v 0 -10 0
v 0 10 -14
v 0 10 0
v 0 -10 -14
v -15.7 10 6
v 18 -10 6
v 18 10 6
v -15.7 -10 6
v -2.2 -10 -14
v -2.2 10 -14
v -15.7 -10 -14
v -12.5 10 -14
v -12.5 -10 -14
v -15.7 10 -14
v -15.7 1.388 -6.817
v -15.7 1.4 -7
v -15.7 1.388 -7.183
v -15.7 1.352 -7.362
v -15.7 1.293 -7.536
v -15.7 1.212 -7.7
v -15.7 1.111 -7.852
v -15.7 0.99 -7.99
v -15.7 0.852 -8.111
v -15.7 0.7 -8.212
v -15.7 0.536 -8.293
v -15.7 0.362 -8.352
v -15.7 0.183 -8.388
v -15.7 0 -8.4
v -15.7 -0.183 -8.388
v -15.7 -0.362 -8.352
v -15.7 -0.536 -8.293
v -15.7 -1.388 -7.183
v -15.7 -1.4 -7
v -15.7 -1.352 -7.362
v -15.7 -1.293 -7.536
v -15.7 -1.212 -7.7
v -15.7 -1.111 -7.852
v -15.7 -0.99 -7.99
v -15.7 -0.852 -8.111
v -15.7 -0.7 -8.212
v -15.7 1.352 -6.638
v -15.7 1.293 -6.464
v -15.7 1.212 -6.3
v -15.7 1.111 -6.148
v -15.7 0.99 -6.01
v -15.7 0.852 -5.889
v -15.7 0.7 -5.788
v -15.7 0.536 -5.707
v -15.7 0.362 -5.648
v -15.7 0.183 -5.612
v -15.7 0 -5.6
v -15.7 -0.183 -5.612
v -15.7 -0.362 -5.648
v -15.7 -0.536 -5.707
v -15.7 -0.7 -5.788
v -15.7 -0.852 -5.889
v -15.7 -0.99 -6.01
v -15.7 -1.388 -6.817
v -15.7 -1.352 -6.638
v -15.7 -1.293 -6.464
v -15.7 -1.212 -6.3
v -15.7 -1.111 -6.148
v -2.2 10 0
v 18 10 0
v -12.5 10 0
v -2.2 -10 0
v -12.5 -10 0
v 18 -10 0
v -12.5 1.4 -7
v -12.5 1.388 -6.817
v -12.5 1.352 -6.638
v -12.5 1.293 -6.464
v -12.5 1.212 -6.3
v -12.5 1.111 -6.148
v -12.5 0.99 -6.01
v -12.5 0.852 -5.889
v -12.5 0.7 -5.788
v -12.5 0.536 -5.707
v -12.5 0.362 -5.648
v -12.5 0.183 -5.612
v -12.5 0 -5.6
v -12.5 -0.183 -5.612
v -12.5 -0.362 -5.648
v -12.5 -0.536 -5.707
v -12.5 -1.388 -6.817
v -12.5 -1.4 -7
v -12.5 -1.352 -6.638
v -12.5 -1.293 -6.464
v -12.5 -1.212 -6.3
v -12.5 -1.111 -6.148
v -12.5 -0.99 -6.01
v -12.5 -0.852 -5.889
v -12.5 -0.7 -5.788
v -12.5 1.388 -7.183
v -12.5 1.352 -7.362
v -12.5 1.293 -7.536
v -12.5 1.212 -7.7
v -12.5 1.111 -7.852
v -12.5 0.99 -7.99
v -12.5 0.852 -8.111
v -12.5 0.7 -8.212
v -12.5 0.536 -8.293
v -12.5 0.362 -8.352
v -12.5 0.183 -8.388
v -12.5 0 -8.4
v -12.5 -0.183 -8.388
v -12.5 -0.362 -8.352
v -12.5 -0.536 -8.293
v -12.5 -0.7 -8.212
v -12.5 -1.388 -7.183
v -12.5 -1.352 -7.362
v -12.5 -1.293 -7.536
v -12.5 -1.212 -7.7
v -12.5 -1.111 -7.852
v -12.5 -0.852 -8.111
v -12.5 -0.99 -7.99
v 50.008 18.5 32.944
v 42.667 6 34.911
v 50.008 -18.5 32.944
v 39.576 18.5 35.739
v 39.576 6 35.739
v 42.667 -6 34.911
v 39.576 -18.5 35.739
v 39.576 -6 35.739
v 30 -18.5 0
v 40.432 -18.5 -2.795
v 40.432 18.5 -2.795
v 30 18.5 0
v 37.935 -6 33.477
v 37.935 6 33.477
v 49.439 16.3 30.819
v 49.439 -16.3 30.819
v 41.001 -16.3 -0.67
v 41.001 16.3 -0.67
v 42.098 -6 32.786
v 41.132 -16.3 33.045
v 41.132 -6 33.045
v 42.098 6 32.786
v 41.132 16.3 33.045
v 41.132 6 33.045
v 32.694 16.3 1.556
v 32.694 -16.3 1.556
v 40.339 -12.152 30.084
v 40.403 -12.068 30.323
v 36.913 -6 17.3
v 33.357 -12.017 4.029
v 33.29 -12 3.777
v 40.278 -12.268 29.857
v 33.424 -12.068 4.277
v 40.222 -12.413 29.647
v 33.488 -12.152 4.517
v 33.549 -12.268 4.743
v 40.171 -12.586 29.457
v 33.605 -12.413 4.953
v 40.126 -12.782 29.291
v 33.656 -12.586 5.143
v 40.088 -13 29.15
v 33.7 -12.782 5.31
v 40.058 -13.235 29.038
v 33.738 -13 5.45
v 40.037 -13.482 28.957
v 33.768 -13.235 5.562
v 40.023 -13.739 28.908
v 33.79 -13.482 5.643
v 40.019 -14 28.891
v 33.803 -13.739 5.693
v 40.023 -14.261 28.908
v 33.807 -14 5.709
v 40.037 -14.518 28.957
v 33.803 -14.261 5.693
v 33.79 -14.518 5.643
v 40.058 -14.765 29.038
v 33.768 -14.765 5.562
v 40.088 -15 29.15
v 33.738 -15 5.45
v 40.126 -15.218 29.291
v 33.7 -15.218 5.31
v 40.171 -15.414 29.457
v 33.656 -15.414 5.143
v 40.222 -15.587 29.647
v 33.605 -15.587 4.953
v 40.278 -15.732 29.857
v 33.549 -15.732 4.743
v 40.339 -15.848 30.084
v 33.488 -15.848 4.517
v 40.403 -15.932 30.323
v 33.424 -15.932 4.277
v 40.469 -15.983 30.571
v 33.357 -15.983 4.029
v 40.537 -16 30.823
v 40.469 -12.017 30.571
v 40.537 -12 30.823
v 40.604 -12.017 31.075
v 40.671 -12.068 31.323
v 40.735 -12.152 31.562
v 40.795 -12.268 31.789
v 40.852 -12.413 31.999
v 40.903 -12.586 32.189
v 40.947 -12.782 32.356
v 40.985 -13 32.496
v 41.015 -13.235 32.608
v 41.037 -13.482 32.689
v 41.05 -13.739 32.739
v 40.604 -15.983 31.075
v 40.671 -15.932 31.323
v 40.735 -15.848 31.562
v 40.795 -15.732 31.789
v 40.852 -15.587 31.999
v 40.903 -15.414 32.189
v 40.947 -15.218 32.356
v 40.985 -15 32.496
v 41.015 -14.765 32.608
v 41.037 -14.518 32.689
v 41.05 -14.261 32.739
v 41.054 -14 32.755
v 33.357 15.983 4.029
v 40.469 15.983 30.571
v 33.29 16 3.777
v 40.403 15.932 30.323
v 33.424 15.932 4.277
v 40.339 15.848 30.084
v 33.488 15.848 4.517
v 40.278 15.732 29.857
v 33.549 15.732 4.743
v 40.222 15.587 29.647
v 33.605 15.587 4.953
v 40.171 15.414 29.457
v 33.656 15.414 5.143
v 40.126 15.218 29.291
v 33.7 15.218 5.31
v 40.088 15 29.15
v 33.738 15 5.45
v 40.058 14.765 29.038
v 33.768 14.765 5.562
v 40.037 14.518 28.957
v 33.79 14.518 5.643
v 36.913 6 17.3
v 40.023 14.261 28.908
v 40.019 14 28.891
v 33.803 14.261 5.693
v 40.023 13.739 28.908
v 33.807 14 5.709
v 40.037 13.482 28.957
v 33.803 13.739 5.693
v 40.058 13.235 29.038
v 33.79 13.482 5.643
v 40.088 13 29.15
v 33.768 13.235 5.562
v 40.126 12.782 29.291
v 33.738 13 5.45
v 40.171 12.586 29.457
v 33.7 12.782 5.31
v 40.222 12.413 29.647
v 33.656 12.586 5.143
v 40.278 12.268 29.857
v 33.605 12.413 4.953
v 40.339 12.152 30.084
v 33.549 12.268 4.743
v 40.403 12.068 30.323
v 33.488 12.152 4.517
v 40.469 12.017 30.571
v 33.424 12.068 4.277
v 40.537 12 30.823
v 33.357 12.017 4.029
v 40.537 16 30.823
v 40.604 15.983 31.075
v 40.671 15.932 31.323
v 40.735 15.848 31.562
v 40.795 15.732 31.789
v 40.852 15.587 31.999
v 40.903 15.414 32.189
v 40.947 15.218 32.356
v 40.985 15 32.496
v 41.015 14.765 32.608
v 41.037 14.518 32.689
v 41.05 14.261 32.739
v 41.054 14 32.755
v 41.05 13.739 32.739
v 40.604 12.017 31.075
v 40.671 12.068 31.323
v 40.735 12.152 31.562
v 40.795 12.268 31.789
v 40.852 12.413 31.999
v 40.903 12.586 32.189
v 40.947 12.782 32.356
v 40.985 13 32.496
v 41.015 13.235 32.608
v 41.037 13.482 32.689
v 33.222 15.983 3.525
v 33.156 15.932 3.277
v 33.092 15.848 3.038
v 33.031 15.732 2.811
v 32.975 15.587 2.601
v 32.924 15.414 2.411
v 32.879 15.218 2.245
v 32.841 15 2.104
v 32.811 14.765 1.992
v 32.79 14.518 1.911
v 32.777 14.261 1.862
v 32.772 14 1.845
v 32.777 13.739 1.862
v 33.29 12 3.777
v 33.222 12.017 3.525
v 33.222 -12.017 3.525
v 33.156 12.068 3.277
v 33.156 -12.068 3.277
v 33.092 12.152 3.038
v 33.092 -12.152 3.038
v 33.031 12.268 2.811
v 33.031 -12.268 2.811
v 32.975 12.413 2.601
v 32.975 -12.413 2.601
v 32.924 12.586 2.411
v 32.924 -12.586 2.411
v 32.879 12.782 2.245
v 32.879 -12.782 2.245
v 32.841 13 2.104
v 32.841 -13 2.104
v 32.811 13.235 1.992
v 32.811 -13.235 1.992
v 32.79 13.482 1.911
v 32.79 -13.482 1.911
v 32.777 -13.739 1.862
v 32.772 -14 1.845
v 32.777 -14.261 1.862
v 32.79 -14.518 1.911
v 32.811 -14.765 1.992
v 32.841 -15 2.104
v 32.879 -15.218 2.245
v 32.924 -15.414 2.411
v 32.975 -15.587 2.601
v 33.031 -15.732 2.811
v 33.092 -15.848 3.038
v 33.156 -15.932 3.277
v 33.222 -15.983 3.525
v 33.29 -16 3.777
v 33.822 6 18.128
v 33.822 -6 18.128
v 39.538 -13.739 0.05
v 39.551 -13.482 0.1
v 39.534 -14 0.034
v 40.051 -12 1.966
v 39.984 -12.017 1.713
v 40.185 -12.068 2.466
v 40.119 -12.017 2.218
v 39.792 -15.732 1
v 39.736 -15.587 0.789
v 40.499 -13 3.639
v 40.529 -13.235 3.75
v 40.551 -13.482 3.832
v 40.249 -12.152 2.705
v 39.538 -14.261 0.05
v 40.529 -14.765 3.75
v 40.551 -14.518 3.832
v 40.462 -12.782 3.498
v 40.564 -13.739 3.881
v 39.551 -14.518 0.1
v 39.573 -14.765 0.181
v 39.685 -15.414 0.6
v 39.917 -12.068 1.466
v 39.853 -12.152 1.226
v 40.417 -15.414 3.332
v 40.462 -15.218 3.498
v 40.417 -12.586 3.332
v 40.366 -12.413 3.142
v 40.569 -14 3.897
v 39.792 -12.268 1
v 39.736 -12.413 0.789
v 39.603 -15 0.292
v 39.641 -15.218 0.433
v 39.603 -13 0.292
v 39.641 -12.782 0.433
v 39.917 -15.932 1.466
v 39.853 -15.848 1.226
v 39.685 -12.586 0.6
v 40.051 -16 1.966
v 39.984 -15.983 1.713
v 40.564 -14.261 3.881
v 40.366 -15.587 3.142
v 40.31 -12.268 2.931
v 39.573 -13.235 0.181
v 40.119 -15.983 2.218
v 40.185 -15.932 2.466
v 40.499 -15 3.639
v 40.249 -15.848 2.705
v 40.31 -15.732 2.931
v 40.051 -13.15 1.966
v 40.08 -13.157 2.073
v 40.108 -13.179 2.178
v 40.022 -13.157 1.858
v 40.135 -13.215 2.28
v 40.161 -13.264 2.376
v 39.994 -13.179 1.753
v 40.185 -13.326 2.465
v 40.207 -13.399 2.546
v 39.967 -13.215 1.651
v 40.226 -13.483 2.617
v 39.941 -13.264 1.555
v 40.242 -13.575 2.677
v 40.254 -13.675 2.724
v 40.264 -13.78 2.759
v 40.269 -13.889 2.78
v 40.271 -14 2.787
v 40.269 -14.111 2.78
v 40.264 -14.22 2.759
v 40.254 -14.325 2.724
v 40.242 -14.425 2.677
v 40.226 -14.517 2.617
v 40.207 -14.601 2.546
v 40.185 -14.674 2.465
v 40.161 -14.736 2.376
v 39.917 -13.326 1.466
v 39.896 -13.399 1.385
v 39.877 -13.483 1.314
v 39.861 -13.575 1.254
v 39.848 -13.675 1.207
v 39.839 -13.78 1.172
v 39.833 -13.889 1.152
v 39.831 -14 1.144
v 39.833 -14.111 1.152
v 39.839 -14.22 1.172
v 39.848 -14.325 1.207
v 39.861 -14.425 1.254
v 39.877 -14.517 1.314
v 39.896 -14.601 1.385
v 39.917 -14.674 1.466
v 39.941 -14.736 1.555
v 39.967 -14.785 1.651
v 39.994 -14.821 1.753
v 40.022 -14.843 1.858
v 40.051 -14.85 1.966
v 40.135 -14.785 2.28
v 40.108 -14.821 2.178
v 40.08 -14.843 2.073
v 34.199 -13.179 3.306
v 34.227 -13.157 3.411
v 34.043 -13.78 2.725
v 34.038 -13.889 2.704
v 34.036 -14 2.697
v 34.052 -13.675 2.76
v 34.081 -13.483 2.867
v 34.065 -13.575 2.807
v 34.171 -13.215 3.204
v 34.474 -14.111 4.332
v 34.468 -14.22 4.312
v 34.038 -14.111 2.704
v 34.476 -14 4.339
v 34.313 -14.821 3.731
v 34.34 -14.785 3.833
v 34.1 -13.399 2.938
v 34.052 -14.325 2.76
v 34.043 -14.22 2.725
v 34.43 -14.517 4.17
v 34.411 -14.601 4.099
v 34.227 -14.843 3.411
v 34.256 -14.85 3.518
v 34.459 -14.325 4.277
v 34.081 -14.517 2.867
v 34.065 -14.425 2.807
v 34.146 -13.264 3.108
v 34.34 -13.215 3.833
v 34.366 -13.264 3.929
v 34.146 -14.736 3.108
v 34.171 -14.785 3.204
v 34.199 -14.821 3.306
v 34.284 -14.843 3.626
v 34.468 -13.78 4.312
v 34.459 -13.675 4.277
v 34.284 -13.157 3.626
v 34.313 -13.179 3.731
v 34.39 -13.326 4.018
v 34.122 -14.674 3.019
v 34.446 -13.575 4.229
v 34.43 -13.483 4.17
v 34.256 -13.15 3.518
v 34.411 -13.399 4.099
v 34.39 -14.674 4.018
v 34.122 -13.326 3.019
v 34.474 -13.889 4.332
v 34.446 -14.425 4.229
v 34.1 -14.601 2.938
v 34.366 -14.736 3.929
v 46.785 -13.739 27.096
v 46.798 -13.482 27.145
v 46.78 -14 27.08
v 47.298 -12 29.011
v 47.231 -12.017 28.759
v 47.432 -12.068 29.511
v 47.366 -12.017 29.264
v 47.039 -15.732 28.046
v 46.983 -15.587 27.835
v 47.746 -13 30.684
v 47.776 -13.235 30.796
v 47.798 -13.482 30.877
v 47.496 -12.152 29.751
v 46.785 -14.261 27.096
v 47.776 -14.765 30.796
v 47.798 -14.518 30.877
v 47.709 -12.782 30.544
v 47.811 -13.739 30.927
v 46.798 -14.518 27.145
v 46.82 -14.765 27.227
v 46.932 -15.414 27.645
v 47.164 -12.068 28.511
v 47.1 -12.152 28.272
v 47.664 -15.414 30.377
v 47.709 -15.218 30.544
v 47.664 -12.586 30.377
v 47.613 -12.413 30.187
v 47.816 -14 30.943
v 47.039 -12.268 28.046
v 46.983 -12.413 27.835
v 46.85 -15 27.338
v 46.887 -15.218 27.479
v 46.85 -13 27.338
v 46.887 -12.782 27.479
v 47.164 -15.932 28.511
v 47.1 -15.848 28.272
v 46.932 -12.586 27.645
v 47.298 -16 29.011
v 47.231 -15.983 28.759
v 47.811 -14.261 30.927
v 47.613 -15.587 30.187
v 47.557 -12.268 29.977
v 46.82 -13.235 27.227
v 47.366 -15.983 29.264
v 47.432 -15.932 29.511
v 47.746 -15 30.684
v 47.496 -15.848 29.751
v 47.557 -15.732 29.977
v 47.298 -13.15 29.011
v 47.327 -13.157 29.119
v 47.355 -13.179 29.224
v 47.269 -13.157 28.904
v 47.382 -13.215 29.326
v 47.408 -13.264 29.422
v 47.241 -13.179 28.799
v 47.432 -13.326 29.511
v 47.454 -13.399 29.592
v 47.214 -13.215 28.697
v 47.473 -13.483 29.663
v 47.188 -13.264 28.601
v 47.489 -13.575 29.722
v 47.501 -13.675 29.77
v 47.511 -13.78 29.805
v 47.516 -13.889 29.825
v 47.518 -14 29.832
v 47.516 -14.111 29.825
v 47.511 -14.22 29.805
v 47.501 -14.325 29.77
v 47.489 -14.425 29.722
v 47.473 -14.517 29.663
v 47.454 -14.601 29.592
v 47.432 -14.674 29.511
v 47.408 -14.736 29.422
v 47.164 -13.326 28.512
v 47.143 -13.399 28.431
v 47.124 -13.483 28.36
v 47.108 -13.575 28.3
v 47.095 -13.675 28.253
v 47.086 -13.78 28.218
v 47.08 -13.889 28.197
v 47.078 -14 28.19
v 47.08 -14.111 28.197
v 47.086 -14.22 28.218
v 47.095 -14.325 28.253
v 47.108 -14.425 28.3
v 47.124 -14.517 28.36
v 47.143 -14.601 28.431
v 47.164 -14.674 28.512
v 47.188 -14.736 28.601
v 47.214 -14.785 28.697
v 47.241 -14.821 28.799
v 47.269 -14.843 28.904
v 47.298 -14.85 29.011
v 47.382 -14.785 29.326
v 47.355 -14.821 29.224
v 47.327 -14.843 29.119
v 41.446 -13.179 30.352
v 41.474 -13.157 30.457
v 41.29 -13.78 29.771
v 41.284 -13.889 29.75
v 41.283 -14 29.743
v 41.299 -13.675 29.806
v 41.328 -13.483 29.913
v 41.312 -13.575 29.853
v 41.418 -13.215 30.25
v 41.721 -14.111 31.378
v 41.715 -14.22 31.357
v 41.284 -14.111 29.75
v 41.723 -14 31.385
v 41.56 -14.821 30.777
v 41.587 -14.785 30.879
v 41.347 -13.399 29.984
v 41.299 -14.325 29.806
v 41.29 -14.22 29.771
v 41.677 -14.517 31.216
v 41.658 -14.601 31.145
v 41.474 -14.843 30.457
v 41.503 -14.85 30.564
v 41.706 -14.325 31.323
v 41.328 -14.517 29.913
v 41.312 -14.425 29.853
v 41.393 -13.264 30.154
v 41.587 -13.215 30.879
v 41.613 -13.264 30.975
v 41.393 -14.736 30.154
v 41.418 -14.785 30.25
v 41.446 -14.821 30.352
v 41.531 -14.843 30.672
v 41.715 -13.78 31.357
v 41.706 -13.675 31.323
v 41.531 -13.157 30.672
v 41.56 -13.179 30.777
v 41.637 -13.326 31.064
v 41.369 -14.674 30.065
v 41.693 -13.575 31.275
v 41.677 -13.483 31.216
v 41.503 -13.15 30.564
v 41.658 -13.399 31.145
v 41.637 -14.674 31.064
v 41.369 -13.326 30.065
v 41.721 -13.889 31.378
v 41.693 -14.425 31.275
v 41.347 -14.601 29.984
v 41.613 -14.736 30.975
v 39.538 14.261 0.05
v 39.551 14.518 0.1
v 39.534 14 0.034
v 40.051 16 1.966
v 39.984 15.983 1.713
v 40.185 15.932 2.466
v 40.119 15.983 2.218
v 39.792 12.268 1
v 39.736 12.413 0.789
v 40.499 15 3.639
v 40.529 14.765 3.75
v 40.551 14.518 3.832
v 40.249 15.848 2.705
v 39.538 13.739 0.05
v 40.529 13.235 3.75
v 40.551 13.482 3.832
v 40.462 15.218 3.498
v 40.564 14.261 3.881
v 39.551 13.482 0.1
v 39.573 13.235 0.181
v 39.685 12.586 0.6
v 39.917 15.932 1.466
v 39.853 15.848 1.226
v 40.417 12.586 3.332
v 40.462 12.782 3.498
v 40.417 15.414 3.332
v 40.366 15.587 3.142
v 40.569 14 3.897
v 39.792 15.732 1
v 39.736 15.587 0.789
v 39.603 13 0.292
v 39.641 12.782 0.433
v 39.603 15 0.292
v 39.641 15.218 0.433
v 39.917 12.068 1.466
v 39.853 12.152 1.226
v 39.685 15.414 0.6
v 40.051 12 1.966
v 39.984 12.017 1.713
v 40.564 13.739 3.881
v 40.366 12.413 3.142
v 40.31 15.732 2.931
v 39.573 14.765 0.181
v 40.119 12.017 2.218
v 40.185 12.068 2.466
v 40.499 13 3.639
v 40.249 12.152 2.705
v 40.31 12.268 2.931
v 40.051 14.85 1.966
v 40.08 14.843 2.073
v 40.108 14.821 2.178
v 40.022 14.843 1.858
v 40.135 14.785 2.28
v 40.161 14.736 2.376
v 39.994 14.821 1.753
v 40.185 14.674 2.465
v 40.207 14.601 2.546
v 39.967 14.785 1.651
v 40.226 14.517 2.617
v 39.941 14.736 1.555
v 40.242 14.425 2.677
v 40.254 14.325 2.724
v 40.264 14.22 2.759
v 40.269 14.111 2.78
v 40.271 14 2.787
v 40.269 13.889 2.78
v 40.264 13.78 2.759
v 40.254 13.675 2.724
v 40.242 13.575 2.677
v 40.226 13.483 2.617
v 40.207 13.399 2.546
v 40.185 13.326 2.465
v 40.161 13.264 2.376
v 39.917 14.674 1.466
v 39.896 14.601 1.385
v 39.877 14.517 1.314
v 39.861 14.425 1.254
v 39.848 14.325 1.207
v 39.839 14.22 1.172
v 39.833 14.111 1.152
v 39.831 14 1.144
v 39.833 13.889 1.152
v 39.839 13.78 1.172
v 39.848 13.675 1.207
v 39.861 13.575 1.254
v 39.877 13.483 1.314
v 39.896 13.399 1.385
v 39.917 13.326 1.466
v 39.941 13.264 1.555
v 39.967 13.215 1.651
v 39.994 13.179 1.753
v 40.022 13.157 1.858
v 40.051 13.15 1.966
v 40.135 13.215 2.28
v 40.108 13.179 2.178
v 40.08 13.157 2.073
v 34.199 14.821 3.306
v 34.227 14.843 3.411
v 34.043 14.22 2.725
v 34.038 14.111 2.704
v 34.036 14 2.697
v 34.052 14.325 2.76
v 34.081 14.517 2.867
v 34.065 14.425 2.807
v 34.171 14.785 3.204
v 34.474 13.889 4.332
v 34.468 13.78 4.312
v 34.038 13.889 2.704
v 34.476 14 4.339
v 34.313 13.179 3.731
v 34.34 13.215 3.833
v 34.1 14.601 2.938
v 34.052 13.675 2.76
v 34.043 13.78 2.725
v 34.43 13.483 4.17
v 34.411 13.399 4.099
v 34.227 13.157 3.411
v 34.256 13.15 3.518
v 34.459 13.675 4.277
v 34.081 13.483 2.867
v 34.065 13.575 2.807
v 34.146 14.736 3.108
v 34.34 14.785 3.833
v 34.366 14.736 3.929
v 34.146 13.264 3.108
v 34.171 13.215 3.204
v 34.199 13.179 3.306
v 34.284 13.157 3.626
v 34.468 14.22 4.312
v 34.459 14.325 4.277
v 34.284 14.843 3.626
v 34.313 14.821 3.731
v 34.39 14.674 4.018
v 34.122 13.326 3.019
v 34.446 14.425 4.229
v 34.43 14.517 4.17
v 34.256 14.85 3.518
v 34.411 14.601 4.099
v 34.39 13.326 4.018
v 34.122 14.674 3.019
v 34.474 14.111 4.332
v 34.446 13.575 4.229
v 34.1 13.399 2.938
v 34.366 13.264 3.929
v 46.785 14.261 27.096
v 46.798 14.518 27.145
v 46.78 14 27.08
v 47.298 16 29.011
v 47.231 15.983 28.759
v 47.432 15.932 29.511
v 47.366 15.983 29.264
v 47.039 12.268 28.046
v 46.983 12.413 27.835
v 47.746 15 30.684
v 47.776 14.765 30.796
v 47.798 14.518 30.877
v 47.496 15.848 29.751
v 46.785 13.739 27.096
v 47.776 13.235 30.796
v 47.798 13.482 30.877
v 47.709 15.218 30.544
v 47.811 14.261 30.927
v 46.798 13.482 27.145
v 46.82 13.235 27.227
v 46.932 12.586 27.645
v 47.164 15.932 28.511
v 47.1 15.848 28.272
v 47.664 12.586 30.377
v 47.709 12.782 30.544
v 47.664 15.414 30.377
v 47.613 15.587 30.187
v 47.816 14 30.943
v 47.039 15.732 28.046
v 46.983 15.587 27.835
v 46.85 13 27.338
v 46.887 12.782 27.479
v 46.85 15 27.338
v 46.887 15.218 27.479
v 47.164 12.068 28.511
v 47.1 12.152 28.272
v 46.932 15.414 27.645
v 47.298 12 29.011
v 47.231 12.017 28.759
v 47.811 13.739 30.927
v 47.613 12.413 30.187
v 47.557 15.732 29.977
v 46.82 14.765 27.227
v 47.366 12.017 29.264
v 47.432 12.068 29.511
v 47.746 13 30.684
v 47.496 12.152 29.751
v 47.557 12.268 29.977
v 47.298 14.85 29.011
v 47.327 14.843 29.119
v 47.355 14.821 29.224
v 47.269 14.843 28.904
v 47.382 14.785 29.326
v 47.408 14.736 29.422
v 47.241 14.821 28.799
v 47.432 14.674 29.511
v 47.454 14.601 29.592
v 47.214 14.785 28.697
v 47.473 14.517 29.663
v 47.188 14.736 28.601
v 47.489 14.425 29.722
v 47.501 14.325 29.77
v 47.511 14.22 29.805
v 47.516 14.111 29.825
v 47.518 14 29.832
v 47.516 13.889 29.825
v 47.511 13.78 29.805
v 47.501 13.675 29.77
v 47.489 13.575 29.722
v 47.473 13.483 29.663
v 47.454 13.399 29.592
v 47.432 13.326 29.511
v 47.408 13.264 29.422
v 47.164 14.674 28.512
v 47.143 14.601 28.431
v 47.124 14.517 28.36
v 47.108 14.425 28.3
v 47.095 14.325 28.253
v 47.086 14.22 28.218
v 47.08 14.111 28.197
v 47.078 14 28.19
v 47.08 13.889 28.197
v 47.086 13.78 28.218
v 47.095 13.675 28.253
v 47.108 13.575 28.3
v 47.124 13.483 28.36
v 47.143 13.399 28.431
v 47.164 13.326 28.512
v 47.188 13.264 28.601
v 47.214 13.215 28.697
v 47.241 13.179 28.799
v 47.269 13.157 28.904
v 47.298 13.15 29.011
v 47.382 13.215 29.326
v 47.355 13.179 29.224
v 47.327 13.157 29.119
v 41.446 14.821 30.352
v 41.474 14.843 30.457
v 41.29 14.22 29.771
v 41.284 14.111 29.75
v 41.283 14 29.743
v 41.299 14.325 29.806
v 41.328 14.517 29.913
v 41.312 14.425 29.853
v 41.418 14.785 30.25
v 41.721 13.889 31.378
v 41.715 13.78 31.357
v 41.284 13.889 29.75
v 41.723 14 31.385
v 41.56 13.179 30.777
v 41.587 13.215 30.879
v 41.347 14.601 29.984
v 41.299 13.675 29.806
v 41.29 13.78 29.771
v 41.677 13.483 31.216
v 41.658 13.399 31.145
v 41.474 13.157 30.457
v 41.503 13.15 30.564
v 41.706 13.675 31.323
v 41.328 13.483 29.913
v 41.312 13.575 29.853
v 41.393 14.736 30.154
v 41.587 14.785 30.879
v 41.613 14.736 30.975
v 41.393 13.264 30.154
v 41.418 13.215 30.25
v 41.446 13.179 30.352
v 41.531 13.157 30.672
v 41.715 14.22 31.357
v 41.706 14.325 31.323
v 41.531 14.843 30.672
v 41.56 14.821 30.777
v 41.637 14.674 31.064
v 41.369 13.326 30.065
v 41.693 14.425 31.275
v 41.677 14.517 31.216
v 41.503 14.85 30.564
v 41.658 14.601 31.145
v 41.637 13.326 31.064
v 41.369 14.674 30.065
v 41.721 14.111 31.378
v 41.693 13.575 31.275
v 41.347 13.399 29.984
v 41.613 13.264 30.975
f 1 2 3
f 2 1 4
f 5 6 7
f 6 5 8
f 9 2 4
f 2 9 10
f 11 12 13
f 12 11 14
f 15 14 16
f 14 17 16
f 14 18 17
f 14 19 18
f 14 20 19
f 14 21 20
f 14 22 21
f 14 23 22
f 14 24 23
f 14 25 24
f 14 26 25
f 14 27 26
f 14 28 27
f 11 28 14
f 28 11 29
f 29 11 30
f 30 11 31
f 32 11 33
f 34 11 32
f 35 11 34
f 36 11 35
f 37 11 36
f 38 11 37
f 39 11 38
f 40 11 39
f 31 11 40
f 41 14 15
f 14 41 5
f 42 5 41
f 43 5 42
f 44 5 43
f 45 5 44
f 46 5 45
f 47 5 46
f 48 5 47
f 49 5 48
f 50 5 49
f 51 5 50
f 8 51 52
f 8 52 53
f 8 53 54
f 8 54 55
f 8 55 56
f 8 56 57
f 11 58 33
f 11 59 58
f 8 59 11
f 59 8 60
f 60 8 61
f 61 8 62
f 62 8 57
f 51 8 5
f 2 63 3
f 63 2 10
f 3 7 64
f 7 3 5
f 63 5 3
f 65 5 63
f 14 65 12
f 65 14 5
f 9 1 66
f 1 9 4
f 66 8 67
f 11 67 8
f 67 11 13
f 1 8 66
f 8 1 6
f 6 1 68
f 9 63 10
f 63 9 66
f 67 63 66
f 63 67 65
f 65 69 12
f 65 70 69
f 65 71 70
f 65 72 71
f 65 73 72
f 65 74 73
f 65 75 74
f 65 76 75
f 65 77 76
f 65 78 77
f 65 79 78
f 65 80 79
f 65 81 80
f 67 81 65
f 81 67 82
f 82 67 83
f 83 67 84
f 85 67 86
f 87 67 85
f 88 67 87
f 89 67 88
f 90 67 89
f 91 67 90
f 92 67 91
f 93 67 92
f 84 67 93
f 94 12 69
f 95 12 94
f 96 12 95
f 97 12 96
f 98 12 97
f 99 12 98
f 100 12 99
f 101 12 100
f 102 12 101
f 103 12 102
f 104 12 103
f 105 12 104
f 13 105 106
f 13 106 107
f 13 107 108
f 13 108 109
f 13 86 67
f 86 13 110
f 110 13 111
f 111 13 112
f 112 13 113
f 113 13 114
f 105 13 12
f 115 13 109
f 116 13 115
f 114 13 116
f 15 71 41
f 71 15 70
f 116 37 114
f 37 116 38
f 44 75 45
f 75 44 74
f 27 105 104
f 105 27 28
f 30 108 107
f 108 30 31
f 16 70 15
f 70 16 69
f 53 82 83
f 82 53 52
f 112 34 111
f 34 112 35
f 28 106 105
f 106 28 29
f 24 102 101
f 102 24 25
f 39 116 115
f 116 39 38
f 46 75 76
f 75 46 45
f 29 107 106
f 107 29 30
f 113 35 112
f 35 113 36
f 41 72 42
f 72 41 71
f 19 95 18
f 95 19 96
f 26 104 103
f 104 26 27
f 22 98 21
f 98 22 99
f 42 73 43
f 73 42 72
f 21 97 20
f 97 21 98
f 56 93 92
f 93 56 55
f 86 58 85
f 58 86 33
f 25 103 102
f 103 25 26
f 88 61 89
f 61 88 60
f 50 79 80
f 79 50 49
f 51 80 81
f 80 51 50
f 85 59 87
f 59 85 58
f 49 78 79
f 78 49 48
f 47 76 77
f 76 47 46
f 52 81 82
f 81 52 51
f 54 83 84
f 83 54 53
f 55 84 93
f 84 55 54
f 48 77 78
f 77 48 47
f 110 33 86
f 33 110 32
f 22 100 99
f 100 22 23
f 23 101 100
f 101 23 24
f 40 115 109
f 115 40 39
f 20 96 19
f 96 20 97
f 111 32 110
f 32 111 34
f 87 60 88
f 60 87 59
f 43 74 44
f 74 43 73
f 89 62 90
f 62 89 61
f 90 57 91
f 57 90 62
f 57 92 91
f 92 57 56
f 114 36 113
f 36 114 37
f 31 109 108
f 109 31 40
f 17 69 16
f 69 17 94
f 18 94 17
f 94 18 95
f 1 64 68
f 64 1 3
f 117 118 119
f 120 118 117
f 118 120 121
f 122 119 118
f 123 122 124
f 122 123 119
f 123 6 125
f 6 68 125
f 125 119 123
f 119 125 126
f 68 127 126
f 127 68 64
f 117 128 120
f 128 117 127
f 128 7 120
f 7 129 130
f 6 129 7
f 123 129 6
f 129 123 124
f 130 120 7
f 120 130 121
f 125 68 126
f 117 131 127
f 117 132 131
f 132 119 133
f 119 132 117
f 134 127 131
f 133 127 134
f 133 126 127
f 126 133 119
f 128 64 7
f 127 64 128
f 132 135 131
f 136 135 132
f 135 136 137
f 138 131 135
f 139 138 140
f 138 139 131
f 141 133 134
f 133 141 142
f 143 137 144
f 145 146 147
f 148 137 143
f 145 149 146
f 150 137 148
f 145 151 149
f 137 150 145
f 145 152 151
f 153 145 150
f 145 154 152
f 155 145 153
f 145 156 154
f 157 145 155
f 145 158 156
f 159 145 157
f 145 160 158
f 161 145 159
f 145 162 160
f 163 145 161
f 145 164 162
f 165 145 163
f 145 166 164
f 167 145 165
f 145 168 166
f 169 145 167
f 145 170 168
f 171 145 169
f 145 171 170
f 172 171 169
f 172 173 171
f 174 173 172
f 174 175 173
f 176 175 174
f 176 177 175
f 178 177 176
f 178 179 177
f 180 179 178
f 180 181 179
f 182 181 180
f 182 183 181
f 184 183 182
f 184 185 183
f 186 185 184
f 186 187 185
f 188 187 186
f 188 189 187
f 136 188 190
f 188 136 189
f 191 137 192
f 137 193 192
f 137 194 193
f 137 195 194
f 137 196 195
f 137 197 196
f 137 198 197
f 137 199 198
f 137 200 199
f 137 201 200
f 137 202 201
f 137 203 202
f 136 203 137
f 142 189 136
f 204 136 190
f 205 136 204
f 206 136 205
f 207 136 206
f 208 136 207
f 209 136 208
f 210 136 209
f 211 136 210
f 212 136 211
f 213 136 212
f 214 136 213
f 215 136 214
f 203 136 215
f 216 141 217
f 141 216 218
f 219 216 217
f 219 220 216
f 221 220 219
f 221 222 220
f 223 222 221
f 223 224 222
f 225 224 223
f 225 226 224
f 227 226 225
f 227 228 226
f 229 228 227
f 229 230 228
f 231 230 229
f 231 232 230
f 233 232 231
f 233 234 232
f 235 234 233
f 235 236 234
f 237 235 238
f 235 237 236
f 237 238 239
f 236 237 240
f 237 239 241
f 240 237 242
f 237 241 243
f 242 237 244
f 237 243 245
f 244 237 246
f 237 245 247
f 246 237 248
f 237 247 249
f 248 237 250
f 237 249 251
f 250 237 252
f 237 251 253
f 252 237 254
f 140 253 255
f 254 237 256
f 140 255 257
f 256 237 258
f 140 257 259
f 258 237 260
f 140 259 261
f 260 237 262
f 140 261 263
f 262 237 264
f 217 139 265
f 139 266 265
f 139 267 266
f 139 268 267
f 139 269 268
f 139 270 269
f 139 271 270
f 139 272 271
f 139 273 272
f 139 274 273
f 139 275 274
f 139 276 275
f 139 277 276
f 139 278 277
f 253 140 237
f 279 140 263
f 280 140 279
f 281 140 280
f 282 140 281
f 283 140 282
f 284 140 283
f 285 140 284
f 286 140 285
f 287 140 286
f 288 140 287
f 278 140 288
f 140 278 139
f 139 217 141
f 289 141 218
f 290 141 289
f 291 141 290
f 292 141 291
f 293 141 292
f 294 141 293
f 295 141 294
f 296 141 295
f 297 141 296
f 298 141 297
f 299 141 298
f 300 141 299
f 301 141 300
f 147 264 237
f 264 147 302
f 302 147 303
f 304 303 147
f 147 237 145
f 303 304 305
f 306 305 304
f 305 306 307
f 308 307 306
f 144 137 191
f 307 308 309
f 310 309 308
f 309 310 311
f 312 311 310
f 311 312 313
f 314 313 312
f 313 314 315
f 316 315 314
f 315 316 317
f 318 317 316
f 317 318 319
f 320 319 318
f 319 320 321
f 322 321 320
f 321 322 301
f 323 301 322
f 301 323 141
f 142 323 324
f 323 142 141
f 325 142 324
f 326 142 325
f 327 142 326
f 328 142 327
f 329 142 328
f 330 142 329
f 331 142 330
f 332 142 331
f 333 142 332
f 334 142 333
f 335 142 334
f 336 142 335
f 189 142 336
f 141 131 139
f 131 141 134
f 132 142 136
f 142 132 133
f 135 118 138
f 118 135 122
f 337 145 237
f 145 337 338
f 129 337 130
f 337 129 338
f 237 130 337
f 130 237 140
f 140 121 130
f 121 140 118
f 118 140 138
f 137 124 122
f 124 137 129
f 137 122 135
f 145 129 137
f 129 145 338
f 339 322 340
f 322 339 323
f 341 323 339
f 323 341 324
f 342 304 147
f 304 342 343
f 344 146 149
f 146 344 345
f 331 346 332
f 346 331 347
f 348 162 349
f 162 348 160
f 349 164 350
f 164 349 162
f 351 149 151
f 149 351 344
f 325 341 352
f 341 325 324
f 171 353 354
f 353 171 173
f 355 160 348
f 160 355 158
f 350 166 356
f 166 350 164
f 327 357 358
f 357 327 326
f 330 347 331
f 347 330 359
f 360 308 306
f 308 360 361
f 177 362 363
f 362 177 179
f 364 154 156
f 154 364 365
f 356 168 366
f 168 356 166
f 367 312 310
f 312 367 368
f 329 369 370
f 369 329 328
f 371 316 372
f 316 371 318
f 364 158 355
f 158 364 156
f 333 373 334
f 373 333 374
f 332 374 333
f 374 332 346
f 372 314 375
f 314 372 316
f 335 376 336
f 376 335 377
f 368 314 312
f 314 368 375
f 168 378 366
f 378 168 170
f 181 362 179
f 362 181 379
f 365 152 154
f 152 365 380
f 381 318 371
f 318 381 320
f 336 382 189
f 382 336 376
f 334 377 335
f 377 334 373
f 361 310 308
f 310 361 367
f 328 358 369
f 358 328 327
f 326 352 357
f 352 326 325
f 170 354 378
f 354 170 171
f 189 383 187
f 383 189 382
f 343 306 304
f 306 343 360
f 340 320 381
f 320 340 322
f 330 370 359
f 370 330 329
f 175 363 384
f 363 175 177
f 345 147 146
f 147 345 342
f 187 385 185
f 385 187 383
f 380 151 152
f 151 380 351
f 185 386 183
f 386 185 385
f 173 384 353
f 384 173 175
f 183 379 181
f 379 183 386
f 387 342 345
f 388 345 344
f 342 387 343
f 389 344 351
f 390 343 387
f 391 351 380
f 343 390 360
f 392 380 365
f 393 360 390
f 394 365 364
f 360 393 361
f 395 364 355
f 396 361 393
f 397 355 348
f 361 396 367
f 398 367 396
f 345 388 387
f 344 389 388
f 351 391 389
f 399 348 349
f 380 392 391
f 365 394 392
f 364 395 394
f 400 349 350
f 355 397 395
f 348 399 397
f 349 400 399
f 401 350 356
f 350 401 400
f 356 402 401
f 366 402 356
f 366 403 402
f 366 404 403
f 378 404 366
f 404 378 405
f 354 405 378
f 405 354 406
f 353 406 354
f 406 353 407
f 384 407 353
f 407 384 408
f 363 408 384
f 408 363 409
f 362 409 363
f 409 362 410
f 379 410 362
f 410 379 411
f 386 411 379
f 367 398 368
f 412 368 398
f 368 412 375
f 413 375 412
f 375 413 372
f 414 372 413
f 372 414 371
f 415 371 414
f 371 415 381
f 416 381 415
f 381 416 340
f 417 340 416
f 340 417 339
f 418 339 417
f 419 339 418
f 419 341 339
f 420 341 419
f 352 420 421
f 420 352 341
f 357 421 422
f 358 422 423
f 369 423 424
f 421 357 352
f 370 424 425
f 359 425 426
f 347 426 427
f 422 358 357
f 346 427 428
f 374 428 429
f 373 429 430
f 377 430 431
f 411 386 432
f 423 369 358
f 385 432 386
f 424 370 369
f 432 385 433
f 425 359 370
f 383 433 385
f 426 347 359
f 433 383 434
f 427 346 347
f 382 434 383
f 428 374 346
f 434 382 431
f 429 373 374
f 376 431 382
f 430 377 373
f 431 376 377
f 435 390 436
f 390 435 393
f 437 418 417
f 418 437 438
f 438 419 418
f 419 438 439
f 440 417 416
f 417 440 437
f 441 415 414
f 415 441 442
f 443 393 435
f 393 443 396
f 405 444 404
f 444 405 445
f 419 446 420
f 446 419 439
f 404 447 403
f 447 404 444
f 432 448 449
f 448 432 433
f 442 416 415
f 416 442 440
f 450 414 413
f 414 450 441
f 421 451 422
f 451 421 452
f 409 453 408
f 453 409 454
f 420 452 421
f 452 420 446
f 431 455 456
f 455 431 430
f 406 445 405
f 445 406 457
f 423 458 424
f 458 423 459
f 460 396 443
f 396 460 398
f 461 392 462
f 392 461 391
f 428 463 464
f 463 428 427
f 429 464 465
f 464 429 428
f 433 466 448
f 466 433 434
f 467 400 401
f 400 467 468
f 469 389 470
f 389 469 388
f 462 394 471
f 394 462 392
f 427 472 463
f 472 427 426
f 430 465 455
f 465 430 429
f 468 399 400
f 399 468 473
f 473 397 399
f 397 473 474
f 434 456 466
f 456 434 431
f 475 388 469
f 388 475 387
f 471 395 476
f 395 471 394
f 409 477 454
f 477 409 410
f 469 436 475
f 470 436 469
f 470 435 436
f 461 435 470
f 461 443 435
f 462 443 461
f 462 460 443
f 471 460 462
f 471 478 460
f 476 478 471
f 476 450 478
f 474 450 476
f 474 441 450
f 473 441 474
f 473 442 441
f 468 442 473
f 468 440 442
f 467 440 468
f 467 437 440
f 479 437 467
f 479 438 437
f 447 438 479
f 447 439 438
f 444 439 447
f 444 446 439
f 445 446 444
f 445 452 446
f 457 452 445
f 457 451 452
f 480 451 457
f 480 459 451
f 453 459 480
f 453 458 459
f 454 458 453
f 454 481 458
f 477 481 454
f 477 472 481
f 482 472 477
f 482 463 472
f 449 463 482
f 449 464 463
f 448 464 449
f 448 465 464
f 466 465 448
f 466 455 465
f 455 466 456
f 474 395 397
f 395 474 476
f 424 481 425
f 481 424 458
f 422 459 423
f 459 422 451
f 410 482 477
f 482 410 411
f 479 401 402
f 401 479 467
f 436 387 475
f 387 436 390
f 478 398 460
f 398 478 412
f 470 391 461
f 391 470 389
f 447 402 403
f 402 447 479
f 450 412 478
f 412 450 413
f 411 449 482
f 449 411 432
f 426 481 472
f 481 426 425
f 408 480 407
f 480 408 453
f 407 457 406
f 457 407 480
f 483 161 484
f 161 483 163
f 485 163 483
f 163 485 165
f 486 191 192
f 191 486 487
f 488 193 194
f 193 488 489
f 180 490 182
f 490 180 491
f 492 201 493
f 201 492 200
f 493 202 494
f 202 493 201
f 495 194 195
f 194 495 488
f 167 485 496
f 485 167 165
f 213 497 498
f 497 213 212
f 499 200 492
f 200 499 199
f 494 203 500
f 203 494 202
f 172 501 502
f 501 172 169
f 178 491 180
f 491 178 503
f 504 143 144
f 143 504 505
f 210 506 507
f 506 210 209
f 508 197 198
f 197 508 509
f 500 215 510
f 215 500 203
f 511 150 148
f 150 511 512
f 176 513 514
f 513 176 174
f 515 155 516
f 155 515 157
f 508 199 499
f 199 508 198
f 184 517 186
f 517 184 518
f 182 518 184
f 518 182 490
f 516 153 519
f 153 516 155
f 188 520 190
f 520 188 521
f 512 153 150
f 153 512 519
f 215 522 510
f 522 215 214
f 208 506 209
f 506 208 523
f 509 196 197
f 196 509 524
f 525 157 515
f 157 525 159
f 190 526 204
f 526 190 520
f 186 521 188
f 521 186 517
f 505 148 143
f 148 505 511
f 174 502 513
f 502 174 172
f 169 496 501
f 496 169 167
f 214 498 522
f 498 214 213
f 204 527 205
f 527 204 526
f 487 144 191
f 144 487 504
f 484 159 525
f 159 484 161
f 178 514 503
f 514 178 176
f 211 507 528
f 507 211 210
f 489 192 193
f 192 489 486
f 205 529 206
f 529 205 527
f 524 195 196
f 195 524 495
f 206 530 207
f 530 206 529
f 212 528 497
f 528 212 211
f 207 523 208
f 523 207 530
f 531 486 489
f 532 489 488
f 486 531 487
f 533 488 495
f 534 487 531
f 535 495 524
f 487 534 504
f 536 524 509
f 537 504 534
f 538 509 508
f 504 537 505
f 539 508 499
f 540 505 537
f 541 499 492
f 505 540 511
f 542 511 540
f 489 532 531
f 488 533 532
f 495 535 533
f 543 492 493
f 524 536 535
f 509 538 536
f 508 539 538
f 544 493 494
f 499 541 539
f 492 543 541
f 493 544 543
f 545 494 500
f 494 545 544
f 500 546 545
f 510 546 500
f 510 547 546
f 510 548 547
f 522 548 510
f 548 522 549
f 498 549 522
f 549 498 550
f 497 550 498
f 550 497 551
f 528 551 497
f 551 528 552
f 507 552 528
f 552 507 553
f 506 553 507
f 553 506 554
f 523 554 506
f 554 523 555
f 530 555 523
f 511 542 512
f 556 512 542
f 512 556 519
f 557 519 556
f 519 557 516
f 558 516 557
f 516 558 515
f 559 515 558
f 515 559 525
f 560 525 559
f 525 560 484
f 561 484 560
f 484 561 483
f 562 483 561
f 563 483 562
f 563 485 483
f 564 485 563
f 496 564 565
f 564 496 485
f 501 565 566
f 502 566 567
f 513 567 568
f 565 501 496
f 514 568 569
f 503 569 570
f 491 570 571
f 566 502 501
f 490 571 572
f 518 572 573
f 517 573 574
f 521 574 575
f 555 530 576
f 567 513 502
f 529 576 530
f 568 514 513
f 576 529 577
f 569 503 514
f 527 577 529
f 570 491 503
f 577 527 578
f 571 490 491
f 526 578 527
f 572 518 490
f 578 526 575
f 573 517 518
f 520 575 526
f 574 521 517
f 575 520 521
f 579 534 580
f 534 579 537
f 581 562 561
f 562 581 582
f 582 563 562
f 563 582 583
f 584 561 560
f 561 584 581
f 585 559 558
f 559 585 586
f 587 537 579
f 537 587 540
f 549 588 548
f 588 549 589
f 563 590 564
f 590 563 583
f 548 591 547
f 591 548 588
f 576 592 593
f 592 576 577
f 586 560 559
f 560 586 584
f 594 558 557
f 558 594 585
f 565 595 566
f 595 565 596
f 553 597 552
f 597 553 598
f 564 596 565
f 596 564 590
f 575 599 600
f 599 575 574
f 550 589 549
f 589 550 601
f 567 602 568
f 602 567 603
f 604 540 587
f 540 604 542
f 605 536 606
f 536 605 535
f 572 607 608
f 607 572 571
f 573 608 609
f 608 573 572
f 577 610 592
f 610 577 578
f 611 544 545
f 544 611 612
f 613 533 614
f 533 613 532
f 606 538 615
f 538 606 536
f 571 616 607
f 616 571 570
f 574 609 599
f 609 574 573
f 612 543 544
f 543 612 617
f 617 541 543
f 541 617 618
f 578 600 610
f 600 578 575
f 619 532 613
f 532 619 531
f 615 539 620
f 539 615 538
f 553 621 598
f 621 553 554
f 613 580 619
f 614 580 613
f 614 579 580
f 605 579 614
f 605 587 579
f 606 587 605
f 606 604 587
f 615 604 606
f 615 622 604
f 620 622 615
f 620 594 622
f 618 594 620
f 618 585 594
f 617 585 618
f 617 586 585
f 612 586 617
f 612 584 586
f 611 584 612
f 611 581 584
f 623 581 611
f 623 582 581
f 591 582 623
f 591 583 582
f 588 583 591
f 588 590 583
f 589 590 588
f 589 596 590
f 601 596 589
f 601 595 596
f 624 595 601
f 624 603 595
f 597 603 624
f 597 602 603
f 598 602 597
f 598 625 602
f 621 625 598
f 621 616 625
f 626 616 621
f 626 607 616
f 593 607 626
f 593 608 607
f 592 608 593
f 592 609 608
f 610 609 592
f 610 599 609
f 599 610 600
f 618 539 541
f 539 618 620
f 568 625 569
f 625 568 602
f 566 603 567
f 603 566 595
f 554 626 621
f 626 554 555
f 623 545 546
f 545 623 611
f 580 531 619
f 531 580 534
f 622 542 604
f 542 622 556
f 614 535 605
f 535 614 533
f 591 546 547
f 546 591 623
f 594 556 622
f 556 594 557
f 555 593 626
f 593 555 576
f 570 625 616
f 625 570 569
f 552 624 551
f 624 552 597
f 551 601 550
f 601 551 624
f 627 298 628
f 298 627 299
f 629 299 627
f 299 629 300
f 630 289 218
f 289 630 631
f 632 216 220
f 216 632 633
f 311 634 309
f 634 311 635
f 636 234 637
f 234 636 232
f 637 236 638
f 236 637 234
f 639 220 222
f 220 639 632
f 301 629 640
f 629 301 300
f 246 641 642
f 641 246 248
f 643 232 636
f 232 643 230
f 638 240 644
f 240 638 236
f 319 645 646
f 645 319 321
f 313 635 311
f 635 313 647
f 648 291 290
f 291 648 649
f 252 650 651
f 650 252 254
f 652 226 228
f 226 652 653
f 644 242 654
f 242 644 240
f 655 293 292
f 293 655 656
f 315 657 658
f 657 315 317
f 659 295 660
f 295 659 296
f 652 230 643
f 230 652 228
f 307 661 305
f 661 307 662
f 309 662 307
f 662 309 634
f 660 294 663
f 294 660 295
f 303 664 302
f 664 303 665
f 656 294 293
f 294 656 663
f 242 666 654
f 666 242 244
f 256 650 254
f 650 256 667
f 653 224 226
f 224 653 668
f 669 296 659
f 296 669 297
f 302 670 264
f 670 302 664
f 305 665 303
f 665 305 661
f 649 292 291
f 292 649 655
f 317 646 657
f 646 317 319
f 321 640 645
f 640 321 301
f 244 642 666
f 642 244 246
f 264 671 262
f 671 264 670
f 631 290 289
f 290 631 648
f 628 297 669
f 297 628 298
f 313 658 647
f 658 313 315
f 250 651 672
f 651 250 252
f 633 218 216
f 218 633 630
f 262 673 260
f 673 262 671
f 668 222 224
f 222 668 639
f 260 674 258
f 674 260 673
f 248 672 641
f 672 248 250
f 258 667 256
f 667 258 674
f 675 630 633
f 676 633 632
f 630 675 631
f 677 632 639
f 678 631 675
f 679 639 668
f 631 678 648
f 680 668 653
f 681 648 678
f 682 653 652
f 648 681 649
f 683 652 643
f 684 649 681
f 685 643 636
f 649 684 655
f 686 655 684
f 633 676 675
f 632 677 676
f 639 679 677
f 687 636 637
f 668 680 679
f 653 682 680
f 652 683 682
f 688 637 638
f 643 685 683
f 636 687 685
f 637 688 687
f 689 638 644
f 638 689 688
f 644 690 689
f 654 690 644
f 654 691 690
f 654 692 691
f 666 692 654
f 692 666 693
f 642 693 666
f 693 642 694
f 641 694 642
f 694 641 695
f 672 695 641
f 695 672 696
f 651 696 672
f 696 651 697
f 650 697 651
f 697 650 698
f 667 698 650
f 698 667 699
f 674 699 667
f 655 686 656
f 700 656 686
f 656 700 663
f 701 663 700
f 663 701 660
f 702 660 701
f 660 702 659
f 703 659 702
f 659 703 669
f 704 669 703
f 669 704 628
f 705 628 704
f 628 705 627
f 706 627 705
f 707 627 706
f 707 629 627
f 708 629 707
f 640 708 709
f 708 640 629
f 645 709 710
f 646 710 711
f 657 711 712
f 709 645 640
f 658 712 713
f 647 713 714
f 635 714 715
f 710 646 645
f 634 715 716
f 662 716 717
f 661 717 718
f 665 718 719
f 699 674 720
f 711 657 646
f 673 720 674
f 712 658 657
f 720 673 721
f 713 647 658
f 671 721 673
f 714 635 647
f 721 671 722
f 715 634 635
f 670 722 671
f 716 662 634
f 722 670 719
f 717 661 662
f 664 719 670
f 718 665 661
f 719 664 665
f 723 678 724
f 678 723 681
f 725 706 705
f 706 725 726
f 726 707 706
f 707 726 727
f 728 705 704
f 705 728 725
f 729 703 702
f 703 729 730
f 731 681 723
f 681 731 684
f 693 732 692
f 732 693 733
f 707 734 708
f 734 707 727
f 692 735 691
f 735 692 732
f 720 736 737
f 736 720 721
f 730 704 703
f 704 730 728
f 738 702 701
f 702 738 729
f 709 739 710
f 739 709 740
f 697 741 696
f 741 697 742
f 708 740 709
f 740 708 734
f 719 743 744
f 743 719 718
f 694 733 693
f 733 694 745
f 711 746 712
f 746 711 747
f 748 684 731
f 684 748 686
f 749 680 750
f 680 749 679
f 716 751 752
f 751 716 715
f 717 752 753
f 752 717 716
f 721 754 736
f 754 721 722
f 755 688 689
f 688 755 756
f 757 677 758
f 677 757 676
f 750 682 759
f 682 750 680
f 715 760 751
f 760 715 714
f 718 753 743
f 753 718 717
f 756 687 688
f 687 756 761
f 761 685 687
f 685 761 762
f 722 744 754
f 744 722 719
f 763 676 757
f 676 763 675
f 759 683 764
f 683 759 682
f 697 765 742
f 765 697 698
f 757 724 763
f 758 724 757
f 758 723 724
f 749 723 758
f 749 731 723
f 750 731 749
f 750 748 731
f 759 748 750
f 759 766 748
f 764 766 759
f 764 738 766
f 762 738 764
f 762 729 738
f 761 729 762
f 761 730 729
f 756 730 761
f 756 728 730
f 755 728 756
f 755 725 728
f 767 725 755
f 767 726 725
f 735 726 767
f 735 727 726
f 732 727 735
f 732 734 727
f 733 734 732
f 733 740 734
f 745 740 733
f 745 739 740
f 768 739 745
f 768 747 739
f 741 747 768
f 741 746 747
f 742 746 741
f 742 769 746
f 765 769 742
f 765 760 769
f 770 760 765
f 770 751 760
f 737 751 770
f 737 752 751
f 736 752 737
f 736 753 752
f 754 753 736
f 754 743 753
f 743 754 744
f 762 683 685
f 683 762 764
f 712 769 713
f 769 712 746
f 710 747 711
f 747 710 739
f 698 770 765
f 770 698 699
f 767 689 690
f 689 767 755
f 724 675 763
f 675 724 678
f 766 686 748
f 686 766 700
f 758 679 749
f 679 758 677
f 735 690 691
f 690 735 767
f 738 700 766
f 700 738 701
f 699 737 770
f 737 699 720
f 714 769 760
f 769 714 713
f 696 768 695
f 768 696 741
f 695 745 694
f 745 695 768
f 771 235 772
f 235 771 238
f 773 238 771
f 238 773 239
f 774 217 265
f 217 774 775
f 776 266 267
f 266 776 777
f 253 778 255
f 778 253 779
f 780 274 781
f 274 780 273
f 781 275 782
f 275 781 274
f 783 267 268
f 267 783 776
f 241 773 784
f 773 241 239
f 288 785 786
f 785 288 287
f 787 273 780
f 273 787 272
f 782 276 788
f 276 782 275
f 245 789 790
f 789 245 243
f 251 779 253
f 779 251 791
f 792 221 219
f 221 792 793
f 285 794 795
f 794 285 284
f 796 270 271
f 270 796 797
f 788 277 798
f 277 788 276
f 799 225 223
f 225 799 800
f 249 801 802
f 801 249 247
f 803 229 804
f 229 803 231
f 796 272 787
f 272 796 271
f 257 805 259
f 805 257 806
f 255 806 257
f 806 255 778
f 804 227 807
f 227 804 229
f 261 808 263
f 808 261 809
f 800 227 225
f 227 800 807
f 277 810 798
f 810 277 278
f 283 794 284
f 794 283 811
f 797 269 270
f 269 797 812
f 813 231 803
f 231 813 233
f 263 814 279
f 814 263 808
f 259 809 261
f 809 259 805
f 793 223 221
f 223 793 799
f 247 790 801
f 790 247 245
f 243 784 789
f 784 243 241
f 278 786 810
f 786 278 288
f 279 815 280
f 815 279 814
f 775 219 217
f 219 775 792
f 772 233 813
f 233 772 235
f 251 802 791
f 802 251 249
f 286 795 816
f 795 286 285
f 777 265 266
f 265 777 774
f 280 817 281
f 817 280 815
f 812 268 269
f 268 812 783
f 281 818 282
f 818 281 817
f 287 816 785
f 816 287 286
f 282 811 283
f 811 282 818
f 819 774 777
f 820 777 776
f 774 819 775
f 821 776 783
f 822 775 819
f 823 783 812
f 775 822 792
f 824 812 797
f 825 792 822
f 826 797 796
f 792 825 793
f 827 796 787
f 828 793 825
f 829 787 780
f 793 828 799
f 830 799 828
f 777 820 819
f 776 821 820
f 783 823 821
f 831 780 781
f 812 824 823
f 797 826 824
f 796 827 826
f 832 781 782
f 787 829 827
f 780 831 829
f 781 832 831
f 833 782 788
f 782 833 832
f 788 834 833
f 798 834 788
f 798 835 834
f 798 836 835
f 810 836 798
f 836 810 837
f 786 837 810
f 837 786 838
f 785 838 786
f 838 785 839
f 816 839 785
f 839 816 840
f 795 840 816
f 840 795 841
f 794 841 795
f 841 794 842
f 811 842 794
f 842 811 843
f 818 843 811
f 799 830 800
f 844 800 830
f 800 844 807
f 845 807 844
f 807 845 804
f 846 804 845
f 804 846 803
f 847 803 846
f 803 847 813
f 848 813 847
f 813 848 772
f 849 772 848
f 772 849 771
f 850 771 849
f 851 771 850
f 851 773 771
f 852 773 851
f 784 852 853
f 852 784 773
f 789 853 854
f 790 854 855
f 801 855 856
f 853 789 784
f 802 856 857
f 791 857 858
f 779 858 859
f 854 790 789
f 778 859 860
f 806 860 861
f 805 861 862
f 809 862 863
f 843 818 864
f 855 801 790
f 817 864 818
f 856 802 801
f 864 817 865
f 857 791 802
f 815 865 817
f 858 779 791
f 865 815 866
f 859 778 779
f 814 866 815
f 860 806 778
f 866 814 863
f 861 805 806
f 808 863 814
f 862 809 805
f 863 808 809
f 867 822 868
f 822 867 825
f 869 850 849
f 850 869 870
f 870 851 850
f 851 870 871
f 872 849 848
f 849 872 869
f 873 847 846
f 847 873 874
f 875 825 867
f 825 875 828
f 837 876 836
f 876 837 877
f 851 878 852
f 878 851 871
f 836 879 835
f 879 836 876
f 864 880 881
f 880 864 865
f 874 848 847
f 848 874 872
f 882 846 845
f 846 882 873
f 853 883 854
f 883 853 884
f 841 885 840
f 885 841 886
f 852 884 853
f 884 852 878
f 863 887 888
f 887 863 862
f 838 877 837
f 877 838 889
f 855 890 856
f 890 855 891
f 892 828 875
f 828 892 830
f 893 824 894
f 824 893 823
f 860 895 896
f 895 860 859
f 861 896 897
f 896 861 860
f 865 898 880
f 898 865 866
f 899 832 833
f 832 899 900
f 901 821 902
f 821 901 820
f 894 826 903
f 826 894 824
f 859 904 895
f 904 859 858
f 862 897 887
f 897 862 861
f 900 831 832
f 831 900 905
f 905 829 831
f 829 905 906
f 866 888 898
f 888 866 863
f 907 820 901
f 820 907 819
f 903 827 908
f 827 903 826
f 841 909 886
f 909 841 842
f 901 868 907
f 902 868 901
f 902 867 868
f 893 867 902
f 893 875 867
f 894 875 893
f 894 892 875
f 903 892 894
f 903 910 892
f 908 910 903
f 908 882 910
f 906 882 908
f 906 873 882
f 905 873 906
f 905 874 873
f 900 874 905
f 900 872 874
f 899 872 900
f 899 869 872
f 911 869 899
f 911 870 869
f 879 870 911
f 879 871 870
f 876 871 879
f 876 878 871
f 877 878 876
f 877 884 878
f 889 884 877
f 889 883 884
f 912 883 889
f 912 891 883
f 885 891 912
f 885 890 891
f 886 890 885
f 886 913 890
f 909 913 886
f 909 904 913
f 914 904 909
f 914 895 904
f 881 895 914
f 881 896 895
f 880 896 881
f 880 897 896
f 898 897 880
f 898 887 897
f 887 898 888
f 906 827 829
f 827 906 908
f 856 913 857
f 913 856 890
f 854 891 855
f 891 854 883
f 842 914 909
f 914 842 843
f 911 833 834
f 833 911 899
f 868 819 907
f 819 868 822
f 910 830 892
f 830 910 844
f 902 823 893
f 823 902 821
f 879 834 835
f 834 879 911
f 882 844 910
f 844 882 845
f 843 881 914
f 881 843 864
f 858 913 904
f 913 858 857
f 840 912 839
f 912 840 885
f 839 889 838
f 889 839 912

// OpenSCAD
// Support de camera OV9732 pour anneau lumineux Target (Corona Vision, etc.)
// Style "bras + tete inclinee + capot avant", a imprimer en 3 exemplaires.
//
// Toutes les cotes sont en mm. MESUREZ VOTRE ANNEAU au pied a coulisse et
// reglez la section "Anneau" avant d'imprimer. Imprimez d'abord
// piece = "test_clip" (quelques minutes) pour verifier le serrage.
//
// Pieces : piece = "support" | "capot" | "test_clip" | "assemblage"

piece = "assemblage";

/* [Anneau lumineux Target] */
// Epaisseur du bord de l'anneau sur lequel le clip s'emboite
anneau_epaisseur = 10.0;
// Profondeur d'emboitement du clip sur le bord
clip_profondeur  = 14;
// Jeu du clip (0.2 = serre, 0.5 = libre ; la vis de serrage rattrape)
clip_jeu         = 0.3;

/* [Bras] */
// Longueur du bras entre le clip et la tete (vers le centre de la cible)
bras_longueur  = 30;
bras_largeur   = 20;
bras_epaisseur = 6;

/* [Camera OV9732] */
// Carte camera carree (32 pour les modules Autodarts, 38 pour les grands)
carte_cote      = 32;
// Entraxe des trous de fixation de la carte
carte_entraxe   = 28;
carte_epaisseur = 1.6;
// Hauteur libre derriere la carte (connecteur, composants)
espace_arriere  = 7;
// Ouverture pour le porte-objectif (carre M12 ~14 mm)
objectif_ouverture = 15;
// Inclinaison de la camera vers la cible (degres)
angle_camera   = 15;

/* [Divers] */
paroi       = 2.2;
capot_ep    = 2.5;
// Diametre de percage pour vis M2 auto-taraudeuses (piliers)
vis_m2_pilote = 1.7;
vis_m2_passage = 2.3;
// Diametre de percage pour la vis de serrage M3 du clip
vis_m3_pilote = 2.8;

$fn = 48;

// ---------- cotes derivees ----------
poche      = carte_cote + 0.6;                 // logement de la carte
tete_cote  = poche + 2 * paroi;                // section exterieure de la tete
tete_prof  = paroi + espace_arriere + carte_epaisseur;
fente      = anneau_epaisseur + clip_jeu;
clip_long  = fente + 2 * paroi + 1;            // encombrement en X du clip

// Repere : X = vers le centre de la cible, Z = vers l'avant (oppose au mur),
// Y = largeur du bras. Le bras est pose sur la face avant de l'anneau,
// le clip s'emboite sur le bord de l'anneau (ouverture vers le mur).

module clip() {
    difference() {
        translate([-clip_long, -bras_largeur/2, -clip_profondeur])
            cube([clip_long, bras_largeur, clip_profondeur + bras_epaisseur]);
        // fente pour le bord de l'anneau
        translate([-clip_long + paroi + 1, -bras_largeur/2 - 1, -clip_profondeur - 1])
            cube([fente, bras_largeur + 2, clip_profondeur + 1]);
        // vis de serrage M3 dans la joue exterieure
        translate([-clip_long - 1, 0, -clip_profondeur/2])
            rotate([0, 90, 0]) cylinder(d = vis_m3_pilote, h = paroi + 3);
    }
}

module bras() {
    translate([-0.01, -bras_largeur/2, 0])
        cube([bras_longueur + 0.02, bras_largeur, bras_epaisseur]);
}

// Tete dans son repere local : axe optique = +X, face avant a x = 0
module tete_pleine_locale() {
    translate([-tete_prof, -tete_cote/2, -tete_cote/2])
        cube([tete_prof, tete_cote, tete_cote]);
}

module tete_vides_locale() {
    // logement de la carte (ouvert a l'avant)
    translate([-tete_prof + paroi, -poche/2, -poche/2])
        cube([tete_prof, poche, poche]);
    // passage du cable a l'arriere (vers le haut / l'avant)
    translate([-tete_prof - 1, -6, 0])
        cube([paroi + 2, 12, tete_cote]);
}

module piliers_locaux() {
    for (sy = [-1, 1], sz = [-1, 1])
        translate([-tete_prof + paroi - 0.5, sy * carte_entraxe/2, sz * carte_entraxe/2])
            rotate([0, 90, 0])
            difference() {
                cylinder(d = 4.0, h = espace_arriere + 0.5);
                translate([0, 0, 1.5]) cylinder(d = vis_m2_pilote, h = espace_arriere + 1);
            }
}

// placement de la tete au bout du bras, inclinee vers le mur
module placer_tete() {
    // le coin arriere-bas de la tete vient se poser sur le bout du bras
    translate([bras_longueur + tete_prof * cos(angle_camera) + tete_cote/2 * sin(angle_camera), 0,
               tete_cote/2 * cos(angle_camera) - tete_prof * sin(angle_camera)])
        rotate([0, angle_camera, 0])
            children();
}

module support() {
    difference() {
        union() {
            clip();
            bras();
            hull() {
                translate([bras_longueur - 12, -bras_largeur/2, 0])
                    cube([12, bras_largeur, bras_epaisseur]);
                placer_tete() tete_pleine_locale();
            }
        }
        placer_tete() tete_vides_locale();
    }
    placer_tete() piliers_locaux();
}

module capot() {
    difference() {
        union() {
            translate([-tete_cote/2, -tete_cote/2, 0])
                cube([tete_cote, tete_cote, capot_ep]);
            // collerette autour de l'objectif (pare-lumiere)
            cylinder(d = objectif_ouverture * 1.414 + 4, h = capot_ep + 4);
        }
        // ouverture objectif (carree, en diagonale incluse)
        translate([-objectif_ouverture/2, -objectif_ouverture/2, -1])
            cube([objectif_ouverture, objectif_ouverture, capot_ep + 2]);
        translate([0, 0, capot_ep])
            cylinder(d = objectif_ouverture * 1.414 + 0.4, h = 10);
        // trous de fixation M2 (traversent capot + carte -> piliers)
        for (sx = [-1, 1], sy = [-1, 1])
            translate([sx * carte_entraxe/2, sy * carte_entraxe/2, -1]) {
                cylinder(d = vis_m2_passage, h = capot_ep + 2);
            }
    }
}

module test_clip() {
    intersection() {
        support();
        translate([-clip_long - 1, -50, -clip_profondeur - 1])
            cube([clip_long + 6, 100, clip_profondeur + bras_epaisseur + 2]);
    }
}

// Orientation d'impression : couche sur le flanc (Y vers le bas),
// le profil clip/bras/tete est alors dans le plan du plateau -> solide.
if (piece == "support")
    rotate([90, 0, 0]) translate([0, bras_largeur/2 > tete_cote/2 ? bras_largeur/2 : tete_cote/2, 0]) support();
else if (piece == "capot")
    capot();
else if (piece == "test_clip")
    rotate([90, 0, 0]) translate([0, bras_largeur/2, 0]) test_clip();
else {
    support();
    %placer_tete() translate([0.5, 0, 0]) rotate([0, 90, 0]) rotate([0, 0, 0]) capot();
}
